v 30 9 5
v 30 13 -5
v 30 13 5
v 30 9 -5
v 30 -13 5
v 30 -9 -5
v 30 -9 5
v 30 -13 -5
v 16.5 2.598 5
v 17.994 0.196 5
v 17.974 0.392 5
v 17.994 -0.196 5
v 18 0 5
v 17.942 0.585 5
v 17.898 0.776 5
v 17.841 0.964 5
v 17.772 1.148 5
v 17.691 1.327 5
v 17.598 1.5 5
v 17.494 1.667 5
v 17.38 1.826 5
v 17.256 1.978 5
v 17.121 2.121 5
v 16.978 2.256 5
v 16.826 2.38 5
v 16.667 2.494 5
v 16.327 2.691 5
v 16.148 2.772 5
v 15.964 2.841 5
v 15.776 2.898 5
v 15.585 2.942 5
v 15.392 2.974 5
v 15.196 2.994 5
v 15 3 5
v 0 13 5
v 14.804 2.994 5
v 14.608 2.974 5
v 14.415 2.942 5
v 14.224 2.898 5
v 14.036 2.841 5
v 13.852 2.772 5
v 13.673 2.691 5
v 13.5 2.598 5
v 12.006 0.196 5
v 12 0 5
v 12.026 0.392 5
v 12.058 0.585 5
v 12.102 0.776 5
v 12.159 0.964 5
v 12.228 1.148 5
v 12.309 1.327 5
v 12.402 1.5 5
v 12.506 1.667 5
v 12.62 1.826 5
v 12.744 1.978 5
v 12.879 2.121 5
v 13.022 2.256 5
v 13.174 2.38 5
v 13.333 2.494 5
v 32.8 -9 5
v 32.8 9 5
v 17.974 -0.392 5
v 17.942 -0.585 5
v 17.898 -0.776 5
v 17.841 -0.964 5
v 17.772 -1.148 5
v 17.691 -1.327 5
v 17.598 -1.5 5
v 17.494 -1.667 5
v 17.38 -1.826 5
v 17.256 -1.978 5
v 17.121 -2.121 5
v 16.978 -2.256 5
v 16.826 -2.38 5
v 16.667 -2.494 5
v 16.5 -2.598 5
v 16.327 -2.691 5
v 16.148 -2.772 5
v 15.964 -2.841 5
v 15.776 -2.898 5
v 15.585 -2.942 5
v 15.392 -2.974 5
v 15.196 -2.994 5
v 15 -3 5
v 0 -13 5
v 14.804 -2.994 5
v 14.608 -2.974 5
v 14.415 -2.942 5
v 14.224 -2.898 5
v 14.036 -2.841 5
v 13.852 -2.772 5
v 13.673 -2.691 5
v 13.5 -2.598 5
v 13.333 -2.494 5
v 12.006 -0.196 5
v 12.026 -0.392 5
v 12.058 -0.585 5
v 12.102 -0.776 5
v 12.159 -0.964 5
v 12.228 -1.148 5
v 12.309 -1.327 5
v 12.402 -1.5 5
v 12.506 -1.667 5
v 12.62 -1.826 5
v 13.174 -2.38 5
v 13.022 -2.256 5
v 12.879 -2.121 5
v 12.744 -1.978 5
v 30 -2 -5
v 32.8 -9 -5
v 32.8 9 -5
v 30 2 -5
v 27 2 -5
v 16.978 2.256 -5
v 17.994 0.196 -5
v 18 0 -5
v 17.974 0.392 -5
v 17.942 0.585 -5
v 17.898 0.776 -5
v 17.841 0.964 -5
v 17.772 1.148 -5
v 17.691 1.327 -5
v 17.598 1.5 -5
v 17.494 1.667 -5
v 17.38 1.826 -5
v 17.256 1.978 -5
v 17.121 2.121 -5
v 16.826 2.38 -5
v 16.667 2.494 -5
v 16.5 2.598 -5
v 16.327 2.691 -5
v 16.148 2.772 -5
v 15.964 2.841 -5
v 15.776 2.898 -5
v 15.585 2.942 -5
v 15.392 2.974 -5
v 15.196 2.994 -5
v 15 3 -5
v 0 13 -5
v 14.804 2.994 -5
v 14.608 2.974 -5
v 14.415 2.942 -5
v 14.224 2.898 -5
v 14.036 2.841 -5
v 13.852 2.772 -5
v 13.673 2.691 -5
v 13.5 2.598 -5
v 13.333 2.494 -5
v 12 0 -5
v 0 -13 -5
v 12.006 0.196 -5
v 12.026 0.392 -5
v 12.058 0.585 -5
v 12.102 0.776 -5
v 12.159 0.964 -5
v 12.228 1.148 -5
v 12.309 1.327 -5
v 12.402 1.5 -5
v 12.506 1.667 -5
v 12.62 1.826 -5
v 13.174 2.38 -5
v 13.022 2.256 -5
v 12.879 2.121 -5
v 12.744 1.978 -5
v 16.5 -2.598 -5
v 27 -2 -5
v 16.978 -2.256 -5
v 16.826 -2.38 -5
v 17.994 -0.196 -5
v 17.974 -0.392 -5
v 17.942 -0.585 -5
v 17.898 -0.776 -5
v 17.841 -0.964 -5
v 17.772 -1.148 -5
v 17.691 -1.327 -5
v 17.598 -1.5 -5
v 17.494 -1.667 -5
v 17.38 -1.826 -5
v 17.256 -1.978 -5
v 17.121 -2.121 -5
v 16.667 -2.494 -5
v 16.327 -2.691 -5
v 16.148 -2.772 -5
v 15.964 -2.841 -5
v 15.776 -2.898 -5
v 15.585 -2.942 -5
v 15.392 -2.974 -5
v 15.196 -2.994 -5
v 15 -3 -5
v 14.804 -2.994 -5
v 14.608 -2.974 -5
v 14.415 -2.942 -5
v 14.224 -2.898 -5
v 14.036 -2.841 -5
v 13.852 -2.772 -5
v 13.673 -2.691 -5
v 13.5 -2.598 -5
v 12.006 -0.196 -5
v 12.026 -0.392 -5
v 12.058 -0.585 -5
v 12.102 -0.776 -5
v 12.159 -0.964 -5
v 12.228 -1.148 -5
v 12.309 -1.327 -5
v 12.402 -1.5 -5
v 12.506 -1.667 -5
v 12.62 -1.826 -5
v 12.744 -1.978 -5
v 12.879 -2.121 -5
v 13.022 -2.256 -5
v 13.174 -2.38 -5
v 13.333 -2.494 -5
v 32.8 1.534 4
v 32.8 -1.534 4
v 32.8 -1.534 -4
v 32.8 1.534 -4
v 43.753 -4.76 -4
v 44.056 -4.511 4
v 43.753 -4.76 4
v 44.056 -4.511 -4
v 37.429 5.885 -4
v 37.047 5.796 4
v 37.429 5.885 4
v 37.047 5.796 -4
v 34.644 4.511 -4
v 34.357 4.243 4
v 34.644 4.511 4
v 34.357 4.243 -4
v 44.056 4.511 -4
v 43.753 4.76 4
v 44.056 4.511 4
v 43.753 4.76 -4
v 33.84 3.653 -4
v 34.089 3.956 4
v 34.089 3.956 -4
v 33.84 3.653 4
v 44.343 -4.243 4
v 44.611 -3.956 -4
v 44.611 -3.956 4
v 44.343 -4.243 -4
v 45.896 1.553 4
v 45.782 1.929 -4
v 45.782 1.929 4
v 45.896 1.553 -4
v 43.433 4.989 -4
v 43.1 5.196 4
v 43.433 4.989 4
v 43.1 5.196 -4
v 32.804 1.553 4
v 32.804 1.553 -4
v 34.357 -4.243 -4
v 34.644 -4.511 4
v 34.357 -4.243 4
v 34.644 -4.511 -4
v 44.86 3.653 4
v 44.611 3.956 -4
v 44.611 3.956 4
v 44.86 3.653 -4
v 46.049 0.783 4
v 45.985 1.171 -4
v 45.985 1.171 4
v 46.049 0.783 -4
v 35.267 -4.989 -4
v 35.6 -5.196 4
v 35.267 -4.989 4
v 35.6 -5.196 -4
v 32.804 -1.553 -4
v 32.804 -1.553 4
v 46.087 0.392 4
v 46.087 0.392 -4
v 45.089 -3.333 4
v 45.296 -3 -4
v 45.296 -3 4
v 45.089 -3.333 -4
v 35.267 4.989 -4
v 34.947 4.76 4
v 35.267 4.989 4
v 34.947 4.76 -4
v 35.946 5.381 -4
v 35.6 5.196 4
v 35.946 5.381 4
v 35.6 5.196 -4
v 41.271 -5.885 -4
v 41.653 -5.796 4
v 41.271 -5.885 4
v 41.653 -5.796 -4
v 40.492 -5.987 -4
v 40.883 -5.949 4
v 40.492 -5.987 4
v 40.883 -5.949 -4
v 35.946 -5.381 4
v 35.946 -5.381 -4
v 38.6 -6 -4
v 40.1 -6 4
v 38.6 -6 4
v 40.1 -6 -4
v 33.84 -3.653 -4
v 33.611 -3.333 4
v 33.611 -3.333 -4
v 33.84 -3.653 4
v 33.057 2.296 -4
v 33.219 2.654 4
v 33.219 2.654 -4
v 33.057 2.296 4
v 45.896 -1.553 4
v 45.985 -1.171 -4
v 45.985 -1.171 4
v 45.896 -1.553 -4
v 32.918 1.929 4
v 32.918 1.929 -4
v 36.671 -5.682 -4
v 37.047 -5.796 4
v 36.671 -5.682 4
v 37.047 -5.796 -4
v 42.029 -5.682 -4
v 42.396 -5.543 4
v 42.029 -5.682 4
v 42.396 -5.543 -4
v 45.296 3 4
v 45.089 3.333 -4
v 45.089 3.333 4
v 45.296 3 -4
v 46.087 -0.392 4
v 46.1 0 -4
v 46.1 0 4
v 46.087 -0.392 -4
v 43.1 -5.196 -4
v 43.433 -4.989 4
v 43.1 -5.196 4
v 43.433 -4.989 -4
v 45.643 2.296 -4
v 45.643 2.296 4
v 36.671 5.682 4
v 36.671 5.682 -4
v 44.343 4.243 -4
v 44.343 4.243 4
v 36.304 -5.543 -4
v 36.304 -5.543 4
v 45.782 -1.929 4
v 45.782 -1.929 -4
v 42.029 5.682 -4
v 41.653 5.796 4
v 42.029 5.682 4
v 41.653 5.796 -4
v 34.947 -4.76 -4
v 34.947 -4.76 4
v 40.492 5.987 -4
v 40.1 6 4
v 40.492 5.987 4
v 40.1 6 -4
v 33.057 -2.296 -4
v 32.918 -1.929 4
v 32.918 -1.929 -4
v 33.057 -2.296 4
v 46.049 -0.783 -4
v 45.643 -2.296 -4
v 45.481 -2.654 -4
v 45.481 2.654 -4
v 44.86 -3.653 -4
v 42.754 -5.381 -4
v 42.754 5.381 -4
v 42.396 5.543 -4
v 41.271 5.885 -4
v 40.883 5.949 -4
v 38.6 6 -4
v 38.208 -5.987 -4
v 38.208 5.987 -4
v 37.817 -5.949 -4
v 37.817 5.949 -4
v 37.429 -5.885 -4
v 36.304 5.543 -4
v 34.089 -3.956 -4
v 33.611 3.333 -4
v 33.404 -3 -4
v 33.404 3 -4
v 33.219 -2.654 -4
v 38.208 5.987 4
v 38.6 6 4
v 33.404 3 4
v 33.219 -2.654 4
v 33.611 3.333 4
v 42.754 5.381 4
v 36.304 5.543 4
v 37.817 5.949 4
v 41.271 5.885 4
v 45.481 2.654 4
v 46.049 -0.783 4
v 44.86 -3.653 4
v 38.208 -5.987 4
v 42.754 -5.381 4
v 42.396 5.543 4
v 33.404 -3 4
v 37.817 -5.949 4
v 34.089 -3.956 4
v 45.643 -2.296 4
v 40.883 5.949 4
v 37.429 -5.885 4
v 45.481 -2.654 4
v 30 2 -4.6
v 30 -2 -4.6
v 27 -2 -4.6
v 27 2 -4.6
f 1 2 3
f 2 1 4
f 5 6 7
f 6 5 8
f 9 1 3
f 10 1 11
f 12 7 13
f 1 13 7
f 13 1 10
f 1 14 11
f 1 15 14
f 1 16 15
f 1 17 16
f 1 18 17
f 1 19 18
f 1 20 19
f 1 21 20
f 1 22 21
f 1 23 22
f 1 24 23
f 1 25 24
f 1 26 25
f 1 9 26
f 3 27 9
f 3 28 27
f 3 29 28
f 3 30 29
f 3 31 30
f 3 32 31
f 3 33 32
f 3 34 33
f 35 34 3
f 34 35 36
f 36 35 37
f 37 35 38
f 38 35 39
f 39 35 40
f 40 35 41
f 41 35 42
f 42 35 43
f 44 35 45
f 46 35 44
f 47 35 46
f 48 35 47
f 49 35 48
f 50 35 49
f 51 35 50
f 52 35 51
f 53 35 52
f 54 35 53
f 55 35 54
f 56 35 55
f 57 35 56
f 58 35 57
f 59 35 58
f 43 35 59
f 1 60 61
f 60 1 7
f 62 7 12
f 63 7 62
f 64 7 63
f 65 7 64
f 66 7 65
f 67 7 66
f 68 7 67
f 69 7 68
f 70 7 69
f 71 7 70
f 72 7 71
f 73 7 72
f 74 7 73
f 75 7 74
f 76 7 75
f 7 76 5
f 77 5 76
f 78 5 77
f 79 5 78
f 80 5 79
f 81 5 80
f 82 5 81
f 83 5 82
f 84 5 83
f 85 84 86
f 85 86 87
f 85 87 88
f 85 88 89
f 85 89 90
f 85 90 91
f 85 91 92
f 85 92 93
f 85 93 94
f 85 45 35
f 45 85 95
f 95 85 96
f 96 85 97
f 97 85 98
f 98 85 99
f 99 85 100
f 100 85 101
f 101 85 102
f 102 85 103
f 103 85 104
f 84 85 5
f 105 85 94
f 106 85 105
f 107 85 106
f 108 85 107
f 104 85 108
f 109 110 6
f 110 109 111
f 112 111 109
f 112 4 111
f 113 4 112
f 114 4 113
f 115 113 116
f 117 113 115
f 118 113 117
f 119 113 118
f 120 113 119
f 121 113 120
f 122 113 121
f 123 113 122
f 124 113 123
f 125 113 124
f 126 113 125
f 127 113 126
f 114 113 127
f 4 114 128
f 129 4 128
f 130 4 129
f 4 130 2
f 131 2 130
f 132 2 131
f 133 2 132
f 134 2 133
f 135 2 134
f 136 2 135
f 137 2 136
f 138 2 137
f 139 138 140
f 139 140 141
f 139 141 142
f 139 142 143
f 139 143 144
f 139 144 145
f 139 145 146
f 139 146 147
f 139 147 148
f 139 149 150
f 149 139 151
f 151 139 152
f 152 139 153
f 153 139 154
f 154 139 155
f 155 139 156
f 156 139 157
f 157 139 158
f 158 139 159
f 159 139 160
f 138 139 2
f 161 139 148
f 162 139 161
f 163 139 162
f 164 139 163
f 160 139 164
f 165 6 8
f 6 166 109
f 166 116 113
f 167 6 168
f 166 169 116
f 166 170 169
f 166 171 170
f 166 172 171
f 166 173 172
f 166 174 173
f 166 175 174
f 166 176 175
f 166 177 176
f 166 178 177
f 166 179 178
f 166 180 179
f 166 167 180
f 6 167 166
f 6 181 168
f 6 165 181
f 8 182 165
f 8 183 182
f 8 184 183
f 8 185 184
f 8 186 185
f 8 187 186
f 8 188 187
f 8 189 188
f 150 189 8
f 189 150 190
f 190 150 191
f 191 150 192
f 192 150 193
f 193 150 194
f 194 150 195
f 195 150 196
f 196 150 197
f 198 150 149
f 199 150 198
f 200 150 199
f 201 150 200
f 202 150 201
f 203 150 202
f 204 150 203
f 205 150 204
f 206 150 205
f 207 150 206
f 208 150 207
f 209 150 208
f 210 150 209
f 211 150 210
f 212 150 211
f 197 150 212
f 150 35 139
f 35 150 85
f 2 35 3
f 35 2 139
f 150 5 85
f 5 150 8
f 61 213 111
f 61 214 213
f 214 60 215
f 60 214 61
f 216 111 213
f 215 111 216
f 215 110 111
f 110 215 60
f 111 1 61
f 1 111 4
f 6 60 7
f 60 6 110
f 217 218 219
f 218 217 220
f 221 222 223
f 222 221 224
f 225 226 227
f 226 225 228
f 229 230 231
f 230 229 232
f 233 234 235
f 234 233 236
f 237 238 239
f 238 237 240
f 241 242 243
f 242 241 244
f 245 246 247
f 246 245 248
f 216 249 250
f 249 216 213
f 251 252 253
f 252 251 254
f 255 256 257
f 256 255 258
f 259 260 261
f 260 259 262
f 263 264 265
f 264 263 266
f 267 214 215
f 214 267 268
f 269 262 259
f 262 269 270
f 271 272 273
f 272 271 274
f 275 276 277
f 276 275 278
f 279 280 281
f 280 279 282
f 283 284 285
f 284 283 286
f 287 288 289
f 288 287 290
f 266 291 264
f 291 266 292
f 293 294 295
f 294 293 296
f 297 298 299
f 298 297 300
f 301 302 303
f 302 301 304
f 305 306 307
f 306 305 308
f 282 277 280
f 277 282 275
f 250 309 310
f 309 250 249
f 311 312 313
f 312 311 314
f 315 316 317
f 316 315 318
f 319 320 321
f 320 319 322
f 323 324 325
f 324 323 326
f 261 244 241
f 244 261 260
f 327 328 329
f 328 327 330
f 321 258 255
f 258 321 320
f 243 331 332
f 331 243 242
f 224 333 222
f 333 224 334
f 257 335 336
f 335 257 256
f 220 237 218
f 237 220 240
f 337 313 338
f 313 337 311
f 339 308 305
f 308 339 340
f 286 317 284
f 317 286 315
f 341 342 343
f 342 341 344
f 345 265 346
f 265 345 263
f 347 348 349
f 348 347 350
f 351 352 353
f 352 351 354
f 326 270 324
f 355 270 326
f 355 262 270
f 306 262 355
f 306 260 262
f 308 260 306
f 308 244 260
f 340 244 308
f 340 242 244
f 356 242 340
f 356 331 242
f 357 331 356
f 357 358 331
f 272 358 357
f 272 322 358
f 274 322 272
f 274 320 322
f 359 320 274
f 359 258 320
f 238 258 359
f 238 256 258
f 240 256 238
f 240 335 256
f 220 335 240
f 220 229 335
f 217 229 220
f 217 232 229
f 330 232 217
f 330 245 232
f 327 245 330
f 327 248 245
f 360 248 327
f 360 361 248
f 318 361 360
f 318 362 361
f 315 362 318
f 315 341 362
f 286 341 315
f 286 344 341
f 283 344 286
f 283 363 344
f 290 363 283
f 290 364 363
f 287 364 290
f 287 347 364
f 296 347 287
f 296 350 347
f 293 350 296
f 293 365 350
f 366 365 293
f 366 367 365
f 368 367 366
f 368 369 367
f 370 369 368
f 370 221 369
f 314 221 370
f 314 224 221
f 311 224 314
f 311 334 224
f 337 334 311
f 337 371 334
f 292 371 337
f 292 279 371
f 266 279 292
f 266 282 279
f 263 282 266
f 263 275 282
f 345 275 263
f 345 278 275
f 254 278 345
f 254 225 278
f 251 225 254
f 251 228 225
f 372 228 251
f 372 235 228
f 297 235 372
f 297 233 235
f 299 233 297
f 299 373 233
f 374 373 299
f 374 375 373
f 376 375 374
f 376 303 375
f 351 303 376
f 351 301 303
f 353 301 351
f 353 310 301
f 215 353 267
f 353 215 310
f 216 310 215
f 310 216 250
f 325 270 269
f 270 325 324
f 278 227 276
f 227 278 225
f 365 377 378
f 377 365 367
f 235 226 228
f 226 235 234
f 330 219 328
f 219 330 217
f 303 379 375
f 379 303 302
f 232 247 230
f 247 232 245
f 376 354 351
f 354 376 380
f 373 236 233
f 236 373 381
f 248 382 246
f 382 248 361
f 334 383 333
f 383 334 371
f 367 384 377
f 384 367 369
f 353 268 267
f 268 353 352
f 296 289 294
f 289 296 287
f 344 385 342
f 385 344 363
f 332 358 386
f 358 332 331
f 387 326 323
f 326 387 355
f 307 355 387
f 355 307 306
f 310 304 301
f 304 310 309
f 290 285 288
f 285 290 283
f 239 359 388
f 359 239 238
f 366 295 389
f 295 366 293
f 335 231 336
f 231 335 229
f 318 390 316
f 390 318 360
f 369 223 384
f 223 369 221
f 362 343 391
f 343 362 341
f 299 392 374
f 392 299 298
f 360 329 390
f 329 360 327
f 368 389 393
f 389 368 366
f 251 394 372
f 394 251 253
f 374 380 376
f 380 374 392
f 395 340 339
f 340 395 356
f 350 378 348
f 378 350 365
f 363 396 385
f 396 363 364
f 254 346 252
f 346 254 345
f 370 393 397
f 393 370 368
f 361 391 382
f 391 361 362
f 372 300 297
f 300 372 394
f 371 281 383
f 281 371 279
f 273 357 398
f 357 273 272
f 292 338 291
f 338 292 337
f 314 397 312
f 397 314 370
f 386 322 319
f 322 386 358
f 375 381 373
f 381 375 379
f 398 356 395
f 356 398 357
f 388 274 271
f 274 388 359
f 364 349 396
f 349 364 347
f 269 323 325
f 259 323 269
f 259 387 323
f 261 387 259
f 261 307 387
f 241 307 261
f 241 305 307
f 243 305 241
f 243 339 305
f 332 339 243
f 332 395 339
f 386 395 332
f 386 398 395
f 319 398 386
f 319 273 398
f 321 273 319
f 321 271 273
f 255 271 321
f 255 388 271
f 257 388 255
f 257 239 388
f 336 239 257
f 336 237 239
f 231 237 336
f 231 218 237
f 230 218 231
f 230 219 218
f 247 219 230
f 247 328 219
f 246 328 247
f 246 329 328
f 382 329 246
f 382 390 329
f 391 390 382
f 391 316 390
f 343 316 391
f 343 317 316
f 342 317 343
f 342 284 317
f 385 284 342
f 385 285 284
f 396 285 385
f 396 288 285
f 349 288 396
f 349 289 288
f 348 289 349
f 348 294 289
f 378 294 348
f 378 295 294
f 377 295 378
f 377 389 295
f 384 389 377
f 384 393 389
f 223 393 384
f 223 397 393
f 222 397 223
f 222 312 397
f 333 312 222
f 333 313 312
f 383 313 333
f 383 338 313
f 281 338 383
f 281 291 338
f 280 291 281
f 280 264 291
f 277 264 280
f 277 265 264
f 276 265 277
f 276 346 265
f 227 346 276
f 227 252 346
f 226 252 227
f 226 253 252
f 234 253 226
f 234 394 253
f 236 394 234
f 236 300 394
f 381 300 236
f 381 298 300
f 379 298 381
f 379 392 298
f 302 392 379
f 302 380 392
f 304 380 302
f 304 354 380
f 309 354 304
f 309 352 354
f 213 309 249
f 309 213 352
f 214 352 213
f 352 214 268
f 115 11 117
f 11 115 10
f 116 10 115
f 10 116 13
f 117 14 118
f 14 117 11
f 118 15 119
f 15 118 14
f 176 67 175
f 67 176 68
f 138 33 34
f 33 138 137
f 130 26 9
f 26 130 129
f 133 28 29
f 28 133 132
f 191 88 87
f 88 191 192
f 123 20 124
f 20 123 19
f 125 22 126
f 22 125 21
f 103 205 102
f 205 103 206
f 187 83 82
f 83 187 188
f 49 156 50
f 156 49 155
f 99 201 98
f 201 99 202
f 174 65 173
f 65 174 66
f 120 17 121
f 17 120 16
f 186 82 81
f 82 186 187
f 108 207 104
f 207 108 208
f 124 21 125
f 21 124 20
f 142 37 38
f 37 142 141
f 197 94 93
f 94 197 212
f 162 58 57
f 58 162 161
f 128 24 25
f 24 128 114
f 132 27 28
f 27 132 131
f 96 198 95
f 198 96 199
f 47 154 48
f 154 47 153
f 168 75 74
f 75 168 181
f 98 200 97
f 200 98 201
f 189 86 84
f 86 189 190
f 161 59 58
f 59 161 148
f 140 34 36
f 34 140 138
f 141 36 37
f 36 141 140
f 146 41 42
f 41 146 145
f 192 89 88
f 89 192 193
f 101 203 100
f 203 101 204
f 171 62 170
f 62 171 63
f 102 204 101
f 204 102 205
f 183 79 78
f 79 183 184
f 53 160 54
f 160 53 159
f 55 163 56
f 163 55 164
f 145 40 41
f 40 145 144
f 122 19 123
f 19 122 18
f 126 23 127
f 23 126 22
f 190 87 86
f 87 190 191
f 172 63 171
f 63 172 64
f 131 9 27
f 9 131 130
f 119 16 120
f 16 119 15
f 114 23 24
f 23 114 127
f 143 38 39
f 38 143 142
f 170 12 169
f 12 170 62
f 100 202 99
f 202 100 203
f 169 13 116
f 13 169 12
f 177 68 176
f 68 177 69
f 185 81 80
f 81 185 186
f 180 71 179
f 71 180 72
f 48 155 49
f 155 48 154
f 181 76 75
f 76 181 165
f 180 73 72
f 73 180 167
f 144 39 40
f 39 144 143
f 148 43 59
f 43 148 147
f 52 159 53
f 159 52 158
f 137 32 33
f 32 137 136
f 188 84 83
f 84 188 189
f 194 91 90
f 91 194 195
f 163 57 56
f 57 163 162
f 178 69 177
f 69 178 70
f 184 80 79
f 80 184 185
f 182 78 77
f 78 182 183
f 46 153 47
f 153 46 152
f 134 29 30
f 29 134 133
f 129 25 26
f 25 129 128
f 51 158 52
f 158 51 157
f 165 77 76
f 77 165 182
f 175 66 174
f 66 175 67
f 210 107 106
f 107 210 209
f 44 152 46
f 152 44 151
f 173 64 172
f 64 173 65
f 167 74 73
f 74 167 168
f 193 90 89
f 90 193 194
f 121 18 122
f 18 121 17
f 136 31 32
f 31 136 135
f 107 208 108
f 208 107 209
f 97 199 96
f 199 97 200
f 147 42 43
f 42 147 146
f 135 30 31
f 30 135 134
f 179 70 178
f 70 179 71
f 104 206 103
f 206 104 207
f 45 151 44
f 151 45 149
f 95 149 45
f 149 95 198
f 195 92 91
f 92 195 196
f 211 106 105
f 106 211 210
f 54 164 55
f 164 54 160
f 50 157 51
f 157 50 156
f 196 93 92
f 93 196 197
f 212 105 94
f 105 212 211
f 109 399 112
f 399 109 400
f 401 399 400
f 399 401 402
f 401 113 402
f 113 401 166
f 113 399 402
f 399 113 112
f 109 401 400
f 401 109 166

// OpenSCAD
// Paddle-like solid: rectangular body + stepped shoulder + obround peg
// Bounding box target: X=43.5, Y=26, Z=10 (elongated along X)

$fn = 96;

// Parameters (mm)
bbox_X = 43.5;
bbox_Y = 26;
bbox_Z = 10;

body_L = 30;
body_W = 26;
body_T = 10;

shoulder_L = 3;
shoulder_W = 18;
shoulder_T = 10;

peg_L = 13.5;
peg_W = 12;   // obround width (diameter of end caps)
peg_T = 8;    // peg thickness (Z)

hole_d = 6;
hole_axis_offset_from_center_Y = 0;
hole_axis_offset_from_center_Z = 0;
hole_center_from_flat_end_X = 15;

notch_W = 4;
notch_L = 3;
notch_D = 2;

eps = 0.2;

// --- Helpers ---
module obround_2d(L, W) {
    // 2D obround along X, centered at origin
    hull() {
        translate([-(L - W)/2, 0]) circle(r=W/2);
        translate([ +(L - W)/2, 0]) circle(r=W/2);
    }
}

module peg_obround_3d(L, W, T) {
    // 3D obround extruded in Z, centered at origin
    linear_extrude(height=T, center=true)
        obround_2d(L, W);
}

// --- Main solids (all centered in Y and Z, start at X=0 flat end) ---
module main_body_block() {
    translate([body_L/2, 0, 0])
        cube([body_L, body_W, body_T], center=true);
}

module shoulder_step_transition() {
    translate([body_L + shoulder_L/2 - eps, 0, 0])
        cube([shoulder_L, shoulder_W, shoulder_T], center=true);
}

module protruding_peg_obround() {
    // Place peg so it starts at end of shoulder and protrudes outward
    translate([body_L + shoulder_L + peg_L/2 - 2*eps, 0, 0])
        peg_obround_3d(peg_L, peg_W, peg_T);
}

// --- Subtractive features ---
module internal_hole() {
    // Through-hole along Z
    translate([hole_center_from_flat_end_X, hole_axis_offset_from_center_Y, hole_axis_offset_from_center_Z])
        cylinder(d=hole_d, h=bbox_Z + 4*eps, center=true);
}

module small_alignment_notch() {
    // Small notch on bottom near shoulder end of main body
    translate([body_L - notch_L/2, 0, -body_T/2 - notch_D/2 + eps])
        cube([notch_L, notch_W, notch_D + 2*eps], center=true);
}

// --- Final model ---
module final_model() {
    difference() {
        union() {
            main_body_block();
            shoulder_step_transition();
            protruding_peg_obround();
        }
        internal_hole();
        small_alignment_notch();
    }
}

final_model();
